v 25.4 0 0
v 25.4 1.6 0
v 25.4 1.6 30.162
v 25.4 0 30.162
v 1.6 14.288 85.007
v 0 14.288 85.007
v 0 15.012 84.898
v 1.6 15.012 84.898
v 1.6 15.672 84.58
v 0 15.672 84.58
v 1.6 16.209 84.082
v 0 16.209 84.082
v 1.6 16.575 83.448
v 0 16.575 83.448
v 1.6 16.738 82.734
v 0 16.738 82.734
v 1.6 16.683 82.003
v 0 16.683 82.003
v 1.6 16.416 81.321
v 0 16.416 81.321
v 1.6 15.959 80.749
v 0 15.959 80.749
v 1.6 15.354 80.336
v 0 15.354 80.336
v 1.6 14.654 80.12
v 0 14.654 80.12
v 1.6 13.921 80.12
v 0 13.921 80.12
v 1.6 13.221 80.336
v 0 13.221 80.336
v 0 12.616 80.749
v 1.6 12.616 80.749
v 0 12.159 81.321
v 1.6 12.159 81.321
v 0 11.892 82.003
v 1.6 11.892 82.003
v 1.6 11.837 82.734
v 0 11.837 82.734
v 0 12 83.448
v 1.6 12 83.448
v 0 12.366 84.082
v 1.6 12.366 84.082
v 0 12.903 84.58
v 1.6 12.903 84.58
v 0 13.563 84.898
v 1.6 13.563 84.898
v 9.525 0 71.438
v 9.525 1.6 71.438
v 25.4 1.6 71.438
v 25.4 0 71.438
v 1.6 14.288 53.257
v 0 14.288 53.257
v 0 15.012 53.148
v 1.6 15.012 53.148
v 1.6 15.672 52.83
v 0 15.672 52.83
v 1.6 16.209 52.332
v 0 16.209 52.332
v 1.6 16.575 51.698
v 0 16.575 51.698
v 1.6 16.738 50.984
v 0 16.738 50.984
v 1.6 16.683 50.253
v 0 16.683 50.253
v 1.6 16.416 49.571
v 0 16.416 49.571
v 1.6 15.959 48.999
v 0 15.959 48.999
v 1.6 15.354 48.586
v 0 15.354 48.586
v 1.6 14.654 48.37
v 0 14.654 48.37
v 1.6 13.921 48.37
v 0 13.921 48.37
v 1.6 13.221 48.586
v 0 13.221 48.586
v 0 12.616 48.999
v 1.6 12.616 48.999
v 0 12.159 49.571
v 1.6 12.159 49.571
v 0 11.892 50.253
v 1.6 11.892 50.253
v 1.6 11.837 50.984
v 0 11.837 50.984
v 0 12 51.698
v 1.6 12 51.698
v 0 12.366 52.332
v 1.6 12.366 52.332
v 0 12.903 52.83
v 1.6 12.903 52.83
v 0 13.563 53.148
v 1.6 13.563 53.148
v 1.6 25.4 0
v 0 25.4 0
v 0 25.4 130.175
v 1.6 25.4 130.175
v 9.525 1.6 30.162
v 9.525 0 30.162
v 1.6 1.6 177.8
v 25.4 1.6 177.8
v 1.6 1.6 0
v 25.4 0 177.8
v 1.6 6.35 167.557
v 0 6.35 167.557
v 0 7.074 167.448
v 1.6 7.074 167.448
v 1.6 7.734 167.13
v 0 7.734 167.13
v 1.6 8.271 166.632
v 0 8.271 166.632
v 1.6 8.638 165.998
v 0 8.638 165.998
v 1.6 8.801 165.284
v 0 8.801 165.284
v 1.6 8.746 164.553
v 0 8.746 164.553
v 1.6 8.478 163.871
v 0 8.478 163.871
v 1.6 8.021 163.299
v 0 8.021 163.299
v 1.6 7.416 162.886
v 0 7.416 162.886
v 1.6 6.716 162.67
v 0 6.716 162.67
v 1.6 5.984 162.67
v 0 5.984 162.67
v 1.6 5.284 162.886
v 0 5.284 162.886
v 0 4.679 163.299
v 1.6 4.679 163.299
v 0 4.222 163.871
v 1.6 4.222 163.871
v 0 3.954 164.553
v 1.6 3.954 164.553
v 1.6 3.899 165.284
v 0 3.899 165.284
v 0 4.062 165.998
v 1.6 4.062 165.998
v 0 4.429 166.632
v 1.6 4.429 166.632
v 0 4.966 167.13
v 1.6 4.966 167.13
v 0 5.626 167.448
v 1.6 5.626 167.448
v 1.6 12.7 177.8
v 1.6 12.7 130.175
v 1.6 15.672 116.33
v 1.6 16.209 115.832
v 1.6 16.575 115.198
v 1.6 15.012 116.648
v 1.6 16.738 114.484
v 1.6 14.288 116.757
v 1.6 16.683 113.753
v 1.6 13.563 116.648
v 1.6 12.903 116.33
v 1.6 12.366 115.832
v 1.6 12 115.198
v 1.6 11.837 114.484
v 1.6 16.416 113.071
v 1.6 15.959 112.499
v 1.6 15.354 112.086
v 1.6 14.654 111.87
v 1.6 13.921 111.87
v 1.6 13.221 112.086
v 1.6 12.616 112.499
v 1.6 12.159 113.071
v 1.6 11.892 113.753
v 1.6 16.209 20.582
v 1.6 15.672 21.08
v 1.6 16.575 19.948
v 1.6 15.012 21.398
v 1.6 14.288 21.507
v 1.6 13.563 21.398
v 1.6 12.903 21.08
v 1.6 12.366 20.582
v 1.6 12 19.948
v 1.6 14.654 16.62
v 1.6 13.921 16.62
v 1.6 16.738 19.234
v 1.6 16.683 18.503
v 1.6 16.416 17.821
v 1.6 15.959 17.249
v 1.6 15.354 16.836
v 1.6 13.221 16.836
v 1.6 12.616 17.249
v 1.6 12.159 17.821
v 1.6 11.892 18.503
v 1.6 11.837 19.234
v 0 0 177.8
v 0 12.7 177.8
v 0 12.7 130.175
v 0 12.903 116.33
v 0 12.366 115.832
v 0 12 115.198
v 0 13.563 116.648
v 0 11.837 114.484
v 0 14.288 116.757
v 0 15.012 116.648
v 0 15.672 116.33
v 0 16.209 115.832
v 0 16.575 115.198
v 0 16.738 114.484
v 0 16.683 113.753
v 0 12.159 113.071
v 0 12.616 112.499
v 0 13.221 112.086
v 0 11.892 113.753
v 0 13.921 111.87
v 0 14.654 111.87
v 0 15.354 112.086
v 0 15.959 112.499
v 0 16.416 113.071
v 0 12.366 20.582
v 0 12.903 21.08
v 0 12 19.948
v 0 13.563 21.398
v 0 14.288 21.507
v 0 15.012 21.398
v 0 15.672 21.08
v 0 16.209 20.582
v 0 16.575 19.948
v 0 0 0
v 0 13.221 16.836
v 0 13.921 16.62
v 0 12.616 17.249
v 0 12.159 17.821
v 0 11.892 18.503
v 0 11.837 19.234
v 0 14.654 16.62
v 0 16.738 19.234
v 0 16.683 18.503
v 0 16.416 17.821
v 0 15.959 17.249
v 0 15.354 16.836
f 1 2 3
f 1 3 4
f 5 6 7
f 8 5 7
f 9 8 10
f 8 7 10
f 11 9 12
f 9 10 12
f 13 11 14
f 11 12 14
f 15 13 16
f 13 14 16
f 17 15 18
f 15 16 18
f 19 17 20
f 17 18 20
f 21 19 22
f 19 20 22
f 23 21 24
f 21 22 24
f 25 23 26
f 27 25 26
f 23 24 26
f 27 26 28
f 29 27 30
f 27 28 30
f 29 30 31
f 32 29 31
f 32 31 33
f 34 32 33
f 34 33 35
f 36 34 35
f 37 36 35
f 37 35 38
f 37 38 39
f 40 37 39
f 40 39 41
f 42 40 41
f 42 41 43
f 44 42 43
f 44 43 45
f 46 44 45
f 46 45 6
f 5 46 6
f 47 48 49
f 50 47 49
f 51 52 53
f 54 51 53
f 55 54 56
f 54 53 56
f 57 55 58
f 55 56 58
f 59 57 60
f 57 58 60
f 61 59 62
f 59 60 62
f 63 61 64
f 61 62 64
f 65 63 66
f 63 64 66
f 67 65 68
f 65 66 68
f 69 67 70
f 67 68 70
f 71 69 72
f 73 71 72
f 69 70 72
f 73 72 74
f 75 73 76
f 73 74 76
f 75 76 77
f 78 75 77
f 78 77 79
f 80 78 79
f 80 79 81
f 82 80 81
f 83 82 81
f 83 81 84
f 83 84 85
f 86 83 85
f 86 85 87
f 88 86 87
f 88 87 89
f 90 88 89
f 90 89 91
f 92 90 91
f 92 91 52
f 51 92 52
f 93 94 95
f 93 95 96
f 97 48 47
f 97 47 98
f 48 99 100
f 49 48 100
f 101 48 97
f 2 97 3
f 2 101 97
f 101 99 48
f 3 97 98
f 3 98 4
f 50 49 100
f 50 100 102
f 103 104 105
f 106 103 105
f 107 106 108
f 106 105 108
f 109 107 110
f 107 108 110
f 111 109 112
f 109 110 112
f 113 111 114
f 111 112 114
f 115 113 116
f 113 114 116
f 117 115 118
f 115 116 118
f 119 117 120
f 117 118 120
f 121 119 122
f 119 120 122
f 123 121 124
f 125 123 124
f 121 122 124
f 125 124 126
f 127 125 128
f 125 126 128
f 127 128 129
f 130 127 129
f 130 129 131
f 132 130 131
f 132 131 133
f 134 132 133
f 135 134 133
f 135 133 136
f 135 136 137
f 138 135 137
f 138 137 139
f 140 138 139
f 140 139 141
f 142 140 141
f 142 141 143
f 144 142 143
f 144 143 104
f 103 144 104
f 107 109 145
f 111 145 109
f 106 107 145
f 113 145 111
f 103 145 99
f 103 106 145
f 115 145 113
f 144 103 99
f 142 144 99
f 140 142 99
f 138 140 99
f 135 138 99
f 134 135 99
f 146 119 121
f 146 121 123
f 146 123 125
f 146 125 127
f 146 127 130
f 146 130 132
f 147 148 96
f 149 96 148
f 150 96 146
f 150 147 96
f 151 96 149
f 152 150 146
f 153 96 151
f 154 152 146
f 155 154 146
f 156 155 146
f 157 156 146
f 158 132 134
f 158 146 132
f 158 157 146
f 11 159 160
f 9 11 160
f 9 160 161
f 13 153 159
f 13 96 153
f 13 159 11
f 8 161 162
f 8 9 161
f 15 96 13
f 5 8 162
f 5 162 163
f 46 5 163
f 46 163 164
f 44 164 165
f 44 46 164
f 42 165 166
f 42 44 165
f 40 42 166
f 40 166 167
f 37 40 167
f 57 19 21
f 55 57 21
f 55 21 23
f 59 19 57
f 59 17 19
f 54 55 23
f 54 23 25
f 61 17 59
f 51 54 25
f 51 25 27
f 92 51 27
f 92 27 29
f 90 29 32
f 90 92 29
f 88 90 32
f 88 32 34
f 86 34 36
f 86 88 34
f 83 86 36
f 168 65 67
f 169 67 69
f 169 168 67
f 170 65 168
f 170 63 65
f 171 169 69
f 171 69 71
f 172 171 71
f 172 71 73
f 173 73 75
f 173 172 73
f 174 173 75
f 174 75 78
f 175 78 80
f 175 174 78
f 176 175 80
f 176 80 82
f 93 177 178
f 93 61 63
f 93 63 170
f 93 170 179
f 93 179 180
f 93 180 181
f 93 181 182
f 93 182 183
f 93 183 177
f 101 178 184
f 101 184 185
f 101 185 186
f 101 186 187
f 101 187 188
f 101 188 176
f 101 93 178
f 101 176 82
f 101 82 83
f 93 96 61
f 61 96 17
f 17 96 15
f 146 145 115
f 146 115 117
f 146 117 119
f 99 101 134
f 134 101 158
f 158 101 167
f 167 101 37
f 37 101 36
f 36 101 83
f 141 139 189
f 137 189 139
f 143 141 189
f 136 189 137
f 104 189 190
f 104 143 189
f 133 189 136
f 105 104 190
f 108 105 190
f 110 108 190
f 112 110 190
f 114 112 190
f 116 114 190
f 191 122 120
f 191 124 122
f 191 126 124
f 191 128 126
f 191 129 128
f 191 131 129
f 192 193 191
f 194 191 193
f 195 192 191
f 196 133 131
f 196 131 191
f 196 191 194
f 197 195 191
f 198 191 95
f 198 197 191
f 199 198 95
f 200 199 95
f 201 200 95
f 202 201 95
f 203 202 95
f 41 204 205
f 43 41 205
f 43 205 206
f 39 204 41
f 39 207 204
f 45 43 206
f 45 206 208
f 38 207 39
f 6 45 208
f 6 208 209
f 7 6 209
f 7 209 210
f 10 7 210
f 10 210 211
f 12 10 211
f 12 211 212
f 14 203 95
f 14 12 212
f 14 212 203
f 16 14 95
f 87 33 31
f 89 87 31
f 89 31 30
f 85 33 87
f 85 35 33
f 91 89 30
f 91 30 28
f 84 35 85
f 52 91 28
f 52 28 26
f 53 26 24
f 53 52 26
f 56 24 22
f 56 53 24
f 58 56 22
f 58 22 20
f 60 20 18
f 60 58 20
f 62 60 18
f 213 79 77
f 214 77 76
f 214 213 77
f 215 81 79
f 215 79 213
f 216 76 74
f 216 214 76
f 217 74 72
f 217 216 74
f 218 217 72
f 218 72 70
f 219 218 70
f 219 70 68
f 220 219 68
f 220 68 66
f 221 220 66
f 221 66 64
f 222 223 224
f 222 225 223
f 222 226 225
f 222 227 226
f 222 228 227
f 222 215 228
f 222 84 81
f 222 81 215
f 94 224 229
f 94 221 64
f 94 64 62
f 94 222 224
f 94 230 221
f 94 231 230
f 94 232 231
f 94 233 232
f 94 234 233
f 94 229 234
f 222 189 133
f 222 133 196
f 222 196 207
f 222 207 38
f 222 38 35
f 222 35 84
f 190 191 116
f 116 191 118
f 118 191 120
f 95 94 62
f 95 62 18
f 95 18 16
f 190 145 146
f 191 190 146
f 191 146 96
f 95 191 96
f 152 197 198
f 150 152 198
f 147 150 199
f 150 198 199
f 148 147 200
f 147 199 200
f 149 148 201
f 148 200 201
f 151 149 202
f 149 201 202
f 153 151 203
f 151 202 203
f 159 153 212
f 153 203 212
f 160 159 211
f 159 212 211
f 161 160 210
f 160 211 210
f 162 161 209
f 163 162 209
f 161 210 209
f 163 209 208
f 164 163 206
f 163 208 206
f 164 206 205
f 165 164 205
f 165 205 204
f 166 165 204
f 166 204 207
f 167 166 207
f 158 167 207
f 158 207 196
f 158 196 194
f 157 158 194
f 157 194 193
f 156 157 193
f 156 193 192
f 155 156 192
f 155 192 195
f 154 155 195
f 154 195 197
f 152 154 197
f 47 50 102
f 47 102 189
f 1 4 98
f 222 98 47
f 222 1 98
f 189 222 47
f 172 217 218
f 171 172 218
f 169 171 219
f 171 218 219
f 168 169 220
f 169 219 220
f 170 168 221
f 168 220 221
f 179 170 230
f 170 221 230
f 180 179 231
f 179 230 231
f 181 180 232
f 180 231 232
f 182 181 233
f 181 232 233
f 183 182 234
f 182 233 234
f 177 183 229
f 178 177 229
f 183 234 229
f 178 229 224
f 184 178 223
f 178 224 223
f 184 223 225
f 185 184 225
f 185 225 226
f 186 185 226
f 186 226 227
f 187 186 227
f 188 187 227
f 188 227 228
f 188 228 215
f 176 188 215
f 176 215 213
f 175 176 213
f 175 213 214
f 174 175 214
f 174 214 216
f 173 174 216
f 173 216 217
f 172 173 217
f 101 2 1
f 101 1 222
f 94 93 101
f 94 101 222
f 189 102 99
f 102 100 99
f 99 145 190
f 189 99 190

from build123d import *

# Parameters (mm, degrees)
BOSS_EXTRUDE1_DEPTH          = 177.8
F_10_0_1935_DIAMETER_HOLE1_D = 4.9149
SKETCH4_W                    = 15.875
SKETCH4_H                    = 41.275
CUT_EXTRUDE1_DEPTH           = 2.6002
SKETCH5_W                    = 47.625
SKETCH5_H                    = 12.7
CUT_EXTRUDE2_DEPTH           = 2.6002
F_10_0_1935_DIAMETER_HOLE2_D = 4.9149


with BuildPart() as part:
    # Sketch1 → Boss-Extrude1 (new body)
    with BuildSketch(Plane.XY):
        Polygon((0, 0), (0, 25.4), (1.6002, 25.4), (1.6002, 1.6002), (25.4, 1.6002), (25.4, 0), align=None)
    extrude(amount=BOSS_EXTRUDE1_DEPTH)

    # #10 (0.1935) Diameter Hole1 (through all)
    with Locations(Plane(origin=(1.6002, 0, 0), x_dir=(0, 0, -1), z_dir=(1, 0, 0))):
        with Locations((-82.55, 14.2875), (-50.8, 14.2875), (-19.05, 14.2875), (-114.3, 14.2875)):
            Hole(F_10_0_1935_DIAMETER_HOLE1_D / 2)

    # Sketch4 → Cut-Extrude1 (cut, through all)
    with BuildSketch(Plane(origin=(0, 1.6002, 0), x_dir=(1, 0, 0), z_dir=(0, 1, 0))):
        with Locations((17.4625, -50.8)):
            Rectangle(SKETCH4_W, SKETCH4_H)
    extrude(amount=-CUT_EXTRUDE1_DEPTH, mode=Mode.SUBTRACT)

    # Sketch5 → Cut-Extrude2 (cut, through all)
    with BuildSketch(Plane(origin=(1.6002, 0, 0), x_dir=(0, 0, -1), z_dir=(1, 0, 0))):
        with Locations((-153.9875, 19.05)):
            Rectangle(SKETCH5_W, SKETCH5_H)
    extrude(amount=-CUT_EXTRUDE2_DEPTH, mode=Mode.SUBTRACT)

    # #10 (0.1935) Diameter Hole2 (through all)
    with Locations(Plane(origin=(1.6002, 0, 0), x_dir=(0, 0, -1), z_dir=(1, 0, 0))):
        with Locations((-165.1, 6.35)):
            Hole(F_10_0_1935_DIAMETER_HOLE2_D / 2)


solid = part.part
